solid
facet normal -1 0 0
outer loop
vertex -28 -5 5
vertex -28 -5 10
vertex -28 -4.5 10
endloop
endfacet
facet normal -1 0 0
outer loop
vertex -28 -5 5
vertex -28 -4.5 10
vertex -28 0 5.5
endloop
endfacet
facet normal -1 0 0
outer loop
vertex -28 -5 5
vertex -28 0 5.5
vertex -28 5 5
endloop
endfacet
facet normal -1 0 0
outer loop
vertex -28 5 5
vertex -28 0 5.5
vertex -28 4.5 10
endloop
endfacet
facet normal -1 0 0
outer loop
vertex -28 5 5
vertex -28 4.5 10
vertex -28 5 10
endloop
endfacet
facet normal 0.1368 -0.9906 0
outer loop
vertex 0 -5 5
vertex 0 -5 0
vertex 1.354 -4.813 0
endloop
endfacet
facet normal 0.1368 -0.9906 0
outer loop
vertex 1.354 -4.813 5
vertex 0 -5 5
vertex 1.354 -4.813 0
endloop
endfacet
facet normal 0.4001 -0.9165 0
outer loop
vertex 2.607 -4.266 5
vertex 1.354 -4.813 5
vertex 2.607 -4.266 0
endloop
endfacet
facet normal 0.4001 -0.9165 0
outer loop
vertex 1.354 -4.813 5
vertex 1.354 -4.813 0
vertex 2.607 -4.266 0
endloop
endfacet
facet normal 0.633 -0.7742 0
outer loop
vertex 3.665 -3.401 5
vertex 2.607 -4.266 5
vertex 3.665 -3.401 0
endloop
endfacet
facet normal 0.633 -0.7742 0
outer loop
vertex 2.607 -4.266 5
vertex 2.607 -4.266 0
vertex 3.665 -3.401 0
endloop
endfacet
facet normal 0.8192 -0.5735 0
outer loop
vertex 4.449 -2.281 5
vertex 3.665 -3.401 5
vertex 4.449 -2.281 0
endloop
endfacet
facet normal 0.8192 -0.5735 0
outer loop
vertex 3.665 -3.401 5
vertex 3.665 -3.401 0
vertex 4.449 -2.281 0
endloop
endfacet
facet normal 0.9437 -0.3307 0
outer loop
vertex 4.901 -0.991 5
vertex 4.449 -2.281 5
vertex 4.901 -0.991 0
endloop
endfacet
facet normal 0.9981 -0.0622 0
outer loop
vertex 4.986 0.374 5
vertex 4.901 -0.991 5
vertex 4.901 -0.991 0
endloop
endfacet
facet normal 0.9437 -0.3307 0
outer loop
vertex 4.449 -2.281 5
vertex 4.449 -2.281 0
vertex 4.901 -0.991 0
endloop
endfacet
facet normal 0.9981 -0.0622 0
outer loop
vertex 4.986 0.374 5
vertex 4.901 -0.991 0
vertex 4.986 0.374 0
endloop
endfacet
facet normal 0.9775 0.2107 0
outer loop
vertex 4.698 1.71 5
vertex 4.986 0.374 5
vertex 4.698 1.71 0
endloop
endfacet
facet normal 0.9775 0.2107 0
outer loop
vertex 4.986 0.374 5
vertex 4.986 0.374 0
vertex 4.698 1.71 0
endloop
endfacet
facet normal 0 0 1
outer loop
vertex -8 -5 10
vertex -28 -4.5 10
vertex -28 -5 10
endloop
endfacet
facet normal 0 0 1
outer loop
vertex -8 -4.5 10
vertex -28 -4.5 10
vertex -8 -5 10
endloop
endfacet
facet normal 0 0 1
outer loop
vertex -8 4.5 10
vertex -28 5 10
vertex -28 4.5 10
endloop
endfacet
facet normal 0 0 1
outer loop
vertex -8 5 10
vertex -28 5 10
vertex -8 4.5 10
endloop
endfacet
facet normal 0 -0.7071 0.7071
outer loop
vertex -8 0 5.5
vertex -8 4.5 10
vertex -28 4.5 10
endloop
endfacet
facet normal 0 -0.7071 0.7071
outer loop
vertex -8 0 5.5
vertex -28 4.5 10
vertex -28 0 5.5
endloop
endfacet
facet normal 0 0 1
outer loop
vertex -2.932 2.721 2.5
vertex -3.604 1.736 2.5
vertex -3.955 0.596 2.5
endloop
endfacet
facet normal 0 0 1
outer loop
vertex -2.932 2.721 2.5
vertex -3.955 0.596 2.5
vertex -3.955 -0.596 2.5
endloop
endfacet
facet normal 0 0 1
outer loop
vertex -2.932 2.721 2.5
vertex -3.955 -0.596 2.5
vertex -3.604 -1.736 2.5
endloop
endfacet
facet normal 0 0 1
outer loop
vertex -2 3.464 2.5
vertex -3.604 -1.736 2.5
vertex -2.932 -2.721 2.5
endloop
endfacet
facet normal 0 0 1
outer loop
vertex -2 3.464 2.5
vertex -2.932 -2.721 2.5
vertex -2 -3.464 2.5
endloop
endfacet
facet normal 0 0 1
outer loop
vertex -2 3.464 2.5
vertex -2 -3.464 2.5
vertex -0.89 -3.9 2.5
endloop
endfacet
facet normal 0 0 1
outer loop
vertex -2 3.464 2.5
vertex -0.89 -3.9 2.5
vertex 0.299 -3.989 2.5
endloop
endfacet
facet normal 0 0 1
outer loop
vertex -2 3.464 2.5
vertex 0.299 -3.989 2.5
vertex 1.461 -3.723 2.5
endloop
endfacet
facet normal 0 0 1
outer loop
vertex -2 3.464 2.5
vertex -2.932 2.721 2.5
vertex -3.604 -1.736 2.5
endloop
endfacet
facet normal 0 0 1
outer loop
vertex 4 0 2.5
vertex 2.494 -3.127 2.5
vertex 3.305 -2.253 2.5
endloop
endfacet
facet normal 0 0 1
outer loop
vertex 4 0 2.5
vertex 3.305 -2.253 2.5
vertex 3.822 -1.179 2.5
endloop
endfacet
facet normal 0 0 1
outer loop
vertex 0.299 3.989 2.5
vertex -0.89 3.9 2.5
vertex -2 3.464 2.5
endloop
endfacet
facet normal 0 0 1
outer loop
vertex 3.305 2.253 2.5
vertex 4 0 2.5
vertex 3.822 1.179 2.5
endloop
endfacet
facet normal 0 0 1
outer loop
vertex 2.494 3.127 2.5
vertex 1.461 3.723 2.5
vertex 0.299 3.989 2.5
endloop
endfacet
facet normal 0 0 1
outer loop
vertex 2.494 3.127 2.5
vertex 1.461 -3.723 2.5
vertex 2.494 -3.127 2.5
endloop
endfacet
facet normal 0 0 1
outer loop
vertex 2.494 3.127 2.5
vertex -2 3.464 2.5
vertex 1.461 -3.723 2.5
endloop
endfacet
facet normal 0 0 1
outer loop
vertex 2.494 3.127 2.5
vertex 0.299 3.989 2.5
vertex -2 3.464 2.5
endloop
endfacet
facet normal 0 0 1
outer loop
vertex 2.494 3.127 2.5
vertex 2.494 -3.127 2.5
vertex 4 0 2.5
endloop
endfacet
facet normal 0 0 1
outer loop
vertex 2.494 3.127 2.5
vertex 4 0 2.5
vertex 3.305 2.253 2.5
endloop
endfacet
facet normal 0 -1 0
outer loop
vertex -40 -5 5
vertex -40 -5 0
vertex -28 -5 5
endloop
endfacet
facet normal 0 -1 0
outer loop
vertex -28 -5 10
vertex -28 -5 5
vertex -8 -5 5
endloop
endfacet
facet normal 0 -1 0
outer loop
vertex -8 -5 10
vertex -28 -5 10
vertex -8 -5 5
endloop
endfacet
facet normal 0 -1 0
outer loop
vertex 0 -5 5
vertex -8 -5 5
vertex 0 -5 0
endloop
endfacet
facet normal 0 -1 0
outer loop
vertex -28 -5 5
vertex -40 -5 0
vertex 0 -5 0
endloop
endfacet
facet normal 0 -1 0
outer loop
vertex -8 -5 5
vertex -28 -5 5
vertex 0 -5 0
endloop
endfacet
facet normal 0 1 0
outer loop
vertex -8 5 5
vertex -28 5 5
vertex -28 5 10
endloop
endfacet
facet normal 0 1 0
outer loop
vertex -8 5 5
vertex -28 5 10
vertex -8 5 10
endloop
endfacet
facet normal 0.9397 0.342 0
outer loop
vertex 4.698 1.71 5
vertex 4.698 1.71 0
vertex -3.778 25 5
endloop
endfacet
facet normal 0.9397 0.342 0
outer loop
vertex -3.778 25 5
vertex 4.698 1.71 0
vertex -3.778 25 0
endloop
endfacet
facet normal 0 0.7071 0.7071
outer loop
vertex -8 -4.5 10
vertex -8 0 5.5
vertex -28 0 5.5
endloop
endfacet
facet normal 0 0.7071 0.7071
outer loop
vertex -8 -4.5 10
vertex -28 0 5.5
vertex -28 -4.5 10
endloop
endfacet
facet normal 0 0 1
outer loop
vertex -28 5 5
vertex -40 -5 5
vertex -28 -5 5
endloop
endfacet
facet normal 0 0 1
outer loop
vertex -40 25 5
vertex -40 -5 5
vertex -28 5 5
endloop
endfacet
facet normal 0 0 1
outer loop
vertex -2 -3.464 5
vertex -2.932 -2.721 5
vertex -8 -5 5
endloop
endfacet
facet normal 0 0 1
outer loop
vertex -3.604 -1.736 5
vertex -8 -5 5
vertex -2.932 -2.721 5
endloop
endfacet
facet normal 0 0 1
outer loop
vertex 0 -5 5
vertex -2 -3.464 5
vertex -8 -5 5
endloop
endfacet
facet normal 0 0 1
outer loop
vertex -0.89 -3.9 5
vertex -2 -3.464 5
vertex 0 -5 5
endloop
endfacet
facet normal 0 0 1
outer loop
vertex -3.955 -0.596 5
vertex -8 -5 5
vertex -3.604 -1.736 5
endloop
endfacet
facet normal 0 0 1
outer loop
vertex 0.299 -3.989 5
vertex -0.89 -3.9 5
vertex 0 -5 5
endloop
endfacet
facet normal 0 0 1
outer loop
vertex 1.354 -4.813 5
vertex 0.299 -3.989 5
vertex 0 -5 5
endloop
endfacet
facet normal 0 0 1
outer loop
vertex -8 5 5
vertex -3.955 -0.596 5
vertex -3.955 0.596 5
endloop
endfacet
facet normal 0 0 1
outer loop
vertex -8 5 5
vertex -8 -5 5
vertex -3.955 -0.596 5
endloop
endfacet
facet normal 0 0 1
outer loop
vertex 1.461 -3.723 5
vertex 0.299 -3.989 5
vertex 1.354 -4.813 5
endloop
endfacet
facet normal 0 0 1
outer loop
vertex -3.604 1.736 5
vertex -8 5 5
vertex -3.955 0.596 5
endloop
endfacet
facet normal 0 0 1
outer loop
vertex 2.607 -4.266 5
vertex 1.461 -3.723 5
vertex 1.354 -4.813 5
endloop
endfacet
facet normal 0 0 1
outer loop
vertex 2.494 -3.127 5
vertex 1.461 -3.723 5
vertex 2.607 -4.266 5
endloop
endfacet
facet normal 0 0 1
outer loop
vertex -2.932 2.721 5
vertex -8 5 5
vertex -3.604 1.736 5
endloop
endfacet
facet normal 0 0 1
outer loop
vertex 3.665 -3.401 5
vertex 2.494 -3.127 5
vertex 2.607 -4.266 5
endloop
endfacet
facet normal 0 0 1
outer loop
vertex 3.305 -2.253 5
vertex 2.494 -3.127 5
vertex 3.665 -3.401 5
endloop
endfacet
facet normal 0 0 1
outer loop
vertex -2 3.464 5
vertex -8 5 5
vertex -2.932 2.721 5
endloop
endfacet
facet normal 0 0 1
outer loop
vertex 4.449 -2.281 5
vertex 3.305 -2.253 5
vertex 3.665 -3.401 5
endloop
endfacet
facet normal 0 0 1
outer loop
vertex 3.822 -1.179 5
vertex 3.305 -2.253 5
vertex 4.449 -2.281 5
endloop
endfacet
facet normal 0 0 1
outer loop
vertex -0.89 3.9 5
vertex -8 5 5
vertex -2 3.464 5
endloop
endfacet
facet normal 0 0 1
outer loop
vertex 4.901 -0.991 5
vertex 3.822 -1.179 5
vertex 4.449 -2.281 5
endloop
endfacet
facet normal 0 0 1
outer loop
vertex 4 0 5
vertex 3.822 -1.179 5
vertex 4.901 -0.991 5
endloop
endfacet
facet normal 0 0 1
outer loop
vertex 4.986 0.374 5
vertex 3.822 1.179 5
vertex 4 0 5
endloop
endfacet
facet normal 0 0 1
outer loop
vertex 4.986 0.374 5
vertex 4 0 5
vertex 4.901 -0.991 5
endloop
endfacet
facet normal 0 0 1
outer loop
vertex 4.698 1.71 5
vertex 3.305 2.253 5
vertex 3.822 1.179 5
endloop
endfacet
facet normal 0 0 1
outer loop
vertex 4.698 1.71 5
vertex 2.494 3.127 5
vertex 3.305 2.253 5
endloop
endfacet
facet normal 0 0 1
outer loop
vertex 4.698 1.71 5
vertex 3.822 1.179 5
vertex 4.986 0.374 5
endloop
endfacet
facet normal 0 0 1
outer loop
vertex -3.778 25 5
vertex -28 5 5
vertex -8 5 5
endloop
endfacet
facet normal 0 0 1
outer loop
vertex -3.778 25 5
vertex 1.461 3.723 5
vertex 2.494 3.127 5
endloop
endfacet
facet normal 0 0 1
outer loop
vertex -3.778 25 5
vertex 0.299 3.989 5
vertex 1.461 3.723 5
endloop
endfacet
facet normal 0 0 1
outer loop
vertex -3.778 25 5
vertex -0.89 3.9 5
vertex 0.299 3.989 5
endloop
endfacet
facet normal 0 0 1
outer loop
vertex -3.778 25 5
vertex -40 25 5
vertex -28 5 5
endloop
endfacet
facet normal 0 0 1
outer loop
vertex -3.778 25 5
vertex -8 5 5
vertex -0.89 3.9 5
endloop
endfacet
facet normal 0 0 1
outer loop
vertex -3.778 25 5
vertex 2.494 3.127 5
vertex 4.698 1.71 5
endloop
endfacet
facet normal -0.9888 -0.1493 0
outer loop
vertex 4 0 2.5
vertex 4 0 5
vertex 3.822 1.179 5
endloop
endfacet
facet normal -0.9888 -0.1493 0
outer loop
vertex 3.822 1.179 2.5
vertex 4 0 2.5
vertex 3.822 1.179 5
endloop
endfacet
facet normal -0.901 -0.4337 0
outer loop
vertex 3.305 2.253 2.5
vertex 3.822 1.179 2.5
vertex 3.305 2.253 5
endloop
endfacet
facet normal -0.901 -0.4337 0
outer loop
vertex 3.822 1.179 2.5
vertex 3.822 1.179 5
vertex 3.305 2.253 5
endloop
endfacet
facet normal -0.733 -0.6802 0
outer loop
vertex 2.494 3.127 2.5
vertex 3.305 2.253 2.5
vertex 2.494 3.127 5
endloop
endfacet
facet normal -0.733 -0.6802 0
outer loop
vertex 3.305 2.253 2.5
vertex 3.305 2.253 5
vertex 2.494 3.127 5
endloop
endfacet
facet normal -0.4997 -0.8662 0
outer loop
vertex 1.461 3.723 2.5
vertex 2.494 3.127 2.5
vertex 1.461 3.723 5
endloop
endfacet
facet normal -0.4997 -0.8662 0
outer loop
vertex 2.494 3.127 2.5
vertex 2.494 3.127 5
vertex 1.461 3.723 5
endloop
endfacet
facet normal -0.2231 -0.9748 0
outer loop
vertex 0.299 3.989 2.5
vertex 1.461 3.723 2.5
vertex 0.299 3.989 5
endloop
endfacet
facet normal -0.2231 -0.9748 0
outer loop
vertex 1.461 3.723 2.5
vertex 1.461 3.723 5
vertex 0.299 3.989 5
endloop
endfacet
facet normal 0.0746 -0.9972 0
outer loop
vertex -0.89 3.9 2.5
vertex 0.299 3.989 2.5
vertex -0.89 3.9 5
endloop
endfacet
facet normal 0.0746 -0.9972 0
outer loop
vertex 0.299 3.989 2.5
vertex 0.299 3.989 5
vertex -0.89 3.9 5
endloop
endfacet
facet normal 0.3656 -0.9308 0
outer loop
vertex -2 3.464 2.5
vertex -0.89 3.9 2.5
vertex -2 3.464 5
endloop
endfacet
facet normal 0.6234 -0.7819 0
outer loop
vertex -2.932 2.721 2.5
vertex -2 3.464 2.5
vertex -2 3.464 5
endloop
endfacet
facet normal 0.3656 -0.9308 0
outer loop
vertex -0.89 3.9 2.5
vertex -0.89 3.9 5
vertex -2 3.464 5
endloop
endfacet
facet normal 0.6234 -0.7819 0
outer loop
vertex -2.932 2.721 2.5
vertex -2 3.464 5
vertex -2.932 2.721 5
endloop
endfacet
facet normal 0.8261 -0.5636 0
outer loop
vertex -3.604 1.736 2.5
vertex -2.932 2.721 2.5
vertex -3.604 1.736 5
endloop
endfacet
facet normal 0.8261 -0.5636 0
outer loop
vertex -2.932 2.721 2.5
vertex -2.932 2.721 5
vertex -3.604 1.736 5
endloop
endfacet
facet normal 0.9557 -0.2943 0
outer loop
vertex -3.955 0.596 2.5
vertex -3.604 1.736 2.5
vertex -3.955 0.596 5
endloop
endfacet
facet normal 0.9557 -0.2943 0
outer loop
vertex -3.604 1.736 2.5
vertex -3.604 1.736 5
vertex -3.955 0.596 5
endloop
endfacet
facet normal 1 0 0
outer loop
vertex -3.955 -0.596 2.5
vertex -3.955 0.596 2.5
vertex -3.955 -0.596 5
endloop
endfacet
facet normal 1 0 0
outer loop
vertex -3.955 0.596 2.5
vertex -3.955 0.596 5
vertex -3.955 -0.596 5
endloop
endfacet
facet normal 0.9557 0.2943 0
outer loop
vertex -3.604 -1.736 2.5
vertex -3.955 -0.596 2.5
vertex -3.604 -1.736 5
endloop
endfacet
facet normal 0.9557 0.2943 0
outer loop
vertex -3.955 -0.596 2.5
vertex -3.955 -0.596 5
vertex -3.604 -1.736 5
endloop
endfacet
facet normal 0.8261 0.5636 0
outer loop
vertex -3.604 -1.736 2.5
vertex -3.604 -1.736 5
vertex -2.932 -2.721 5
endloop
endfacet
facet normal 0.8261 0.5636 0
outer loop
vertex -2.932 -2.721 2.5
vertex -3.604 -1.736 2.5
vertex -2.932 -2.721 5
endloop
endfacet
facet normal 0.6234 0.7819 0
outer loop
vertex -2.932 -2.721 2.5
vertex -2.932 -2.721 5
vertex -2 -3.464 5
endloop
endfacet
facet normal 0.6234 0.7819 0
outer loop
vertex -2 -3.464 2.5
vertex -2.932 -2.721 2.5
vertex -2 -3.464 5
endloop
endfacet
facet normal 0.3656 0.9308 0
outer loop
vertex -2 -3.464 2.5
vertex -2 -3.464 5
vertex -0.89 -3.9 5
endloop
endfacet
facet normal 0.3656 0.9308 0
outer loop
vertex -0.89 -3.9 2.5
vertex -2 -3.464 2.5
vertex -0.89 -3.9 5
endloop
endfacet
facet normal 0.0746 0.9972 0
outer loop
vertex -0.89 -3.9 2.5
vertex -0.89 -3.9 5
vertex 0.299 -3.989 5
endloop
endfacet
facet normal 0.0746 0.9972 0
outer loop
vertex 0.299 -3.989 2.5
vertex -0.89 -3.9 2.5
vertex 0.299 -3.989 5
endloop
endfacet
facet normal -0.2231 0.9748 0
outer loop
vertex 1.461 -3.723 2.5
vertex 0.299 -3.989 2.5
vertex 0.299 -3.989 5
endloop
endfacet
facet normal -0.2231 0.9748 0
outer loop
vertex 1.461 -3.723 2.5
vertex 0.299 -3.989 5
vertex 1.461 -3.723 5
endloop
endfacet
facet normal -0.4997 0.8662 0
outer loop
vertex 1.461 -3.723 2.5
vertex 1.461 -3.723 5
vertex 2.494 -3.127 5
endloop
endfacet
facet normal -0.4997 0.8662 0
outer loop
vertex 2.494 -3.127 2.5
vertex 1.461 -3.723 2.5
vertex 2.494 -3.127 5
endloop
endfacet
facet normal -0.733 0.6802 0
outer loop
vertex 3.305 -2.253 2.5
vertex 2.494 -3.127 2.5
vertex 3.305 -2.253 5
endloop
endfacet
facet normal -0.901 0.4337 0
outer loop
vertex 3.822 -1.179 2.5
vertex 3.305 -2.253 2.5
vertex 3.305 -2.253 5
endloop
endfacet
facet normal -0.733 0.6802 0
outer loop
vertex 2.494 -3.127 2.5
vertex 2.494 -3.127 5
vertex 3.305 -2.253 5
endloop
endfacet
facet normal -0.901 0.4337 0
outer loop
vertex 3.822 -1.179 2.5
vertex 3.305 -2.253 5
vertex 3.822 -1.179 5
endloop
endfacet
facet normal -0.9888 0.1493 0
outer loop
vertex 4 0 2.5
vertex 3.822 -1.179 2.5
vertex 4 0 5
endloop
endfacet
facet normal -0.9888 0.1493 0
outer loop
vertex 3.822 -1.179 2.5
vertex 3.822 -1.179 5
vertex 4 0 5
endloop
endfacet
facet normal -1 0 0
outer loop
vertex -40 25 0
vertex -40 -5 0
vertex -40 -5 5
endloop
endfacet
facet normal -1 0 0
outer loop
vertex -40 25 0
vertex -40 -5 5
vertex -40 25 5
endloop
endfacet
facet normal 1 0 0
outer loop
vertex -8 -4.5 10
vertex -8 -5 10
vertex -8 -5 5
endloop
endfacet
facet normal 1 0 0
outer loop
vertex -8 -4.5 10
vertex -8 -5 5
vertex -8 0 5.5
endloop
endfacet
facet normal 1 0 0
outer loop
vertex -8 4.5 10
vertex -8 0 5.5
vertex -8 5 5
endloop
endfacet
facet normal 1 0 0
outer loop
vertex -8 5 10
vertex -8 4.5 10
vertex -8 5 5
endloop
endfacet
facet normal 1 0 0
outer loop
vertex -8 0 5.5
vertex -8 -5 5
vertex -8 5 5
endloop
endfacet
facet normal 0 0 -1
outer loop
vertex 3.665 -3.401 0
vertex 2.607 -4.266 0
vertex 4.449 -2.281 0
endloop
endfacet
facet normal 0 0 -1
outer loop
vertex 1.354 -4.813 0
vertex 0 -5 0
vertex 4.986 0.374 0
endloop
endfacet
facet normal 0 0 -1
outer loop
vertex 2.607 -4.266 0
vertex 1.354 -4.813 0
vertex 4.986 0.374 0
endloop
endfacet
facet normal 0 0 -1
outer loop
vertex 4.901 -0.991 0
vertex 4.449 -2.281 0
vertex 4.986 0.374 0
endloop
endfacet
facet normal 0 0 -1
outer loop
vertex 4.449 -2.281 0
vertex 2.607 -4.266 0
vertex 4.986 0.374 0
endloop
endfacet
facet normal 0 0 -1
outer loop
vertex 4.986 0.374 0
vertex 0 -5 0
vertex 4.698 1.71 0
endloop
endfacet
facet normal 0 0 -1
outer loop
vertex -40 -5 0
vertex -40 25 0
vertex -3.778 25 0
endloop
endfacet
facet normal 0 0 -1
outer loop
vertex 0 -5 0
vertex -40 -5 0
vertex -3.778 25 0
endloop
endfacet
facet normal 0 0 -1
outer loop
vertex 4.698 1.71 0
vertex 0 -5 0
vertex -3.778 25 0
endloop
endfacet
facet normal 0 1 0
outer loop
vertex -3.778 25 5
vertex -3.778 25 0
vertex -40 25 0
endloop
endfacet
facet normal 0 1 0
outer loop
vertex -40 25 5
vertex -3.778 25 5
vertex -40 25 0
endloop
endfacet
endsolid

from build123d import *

# Parameters (mm, degrees)
SKETCH_1_R          = 5
EXTRUDE_1_DEPTH     = 5
SKETCH_2_R          = 4
CUT_EXTRUDE_1_DEPTH = 2.5
SKETCH_3_W          = 32
SKETCH_3_H          = 10
EXTRUDE_2_DEPTH     = 5
CUT_EXTRUDE_2_DEPTH = 20
SKETCH_5_W          = 12
SKETCH_5_H          = 10
CUT_EXTRUDE_3_DEPTH = 5


with BuildPart() as part:
    # 草图1 → 凸台-拉伸1 (new body)
    with BuildSketch(Plane.XY):
        Circle(SKETCH_1_R)
        with BuildLine():
            Line((-40, -5), (0, -5))
            ThreePointArc((0, -5), (-4.095760221, 2.867882182), (4.698463104, 1.710100717))
            Line((4.698463104, 1.710100717), (-3.778366994, 25))
            Line((-3.778366994, 25), (-40, 25))
            Line((-40, 25), (-40, -5))
        make_face()
    extrude(amount=EXTRUDE_1_DEPTH)

    # 草图2 → 切除-拉伸1 (cut)
    with BuildSketch(Plane.XY.offset(5)):
        Circle(SKETCH_2_R)
    extrude(amount=-CUT_EXTRUDE_1_DEPTH, mode=Mode.SUBTRACT)

    # 草图3 → 凸台-拉伸2 (add)
    with BuildSketch(Plane.XY.offset(5)):
        with Locations((-24, 0)):
            Rectangle(SKETCH_3_W, SKETCH_3_H)
    extrude(amount=EXTRUDE_2_DEPTH)

    # 草图4 → 切除-拉伸2 (cut)
    with BuildSketch(Plane(origin=(-8, 0, 0), x_dir=(0, 0, -1), z_dir=(1, 0, 0))):
        Polygon((-10, 4.5), (-5.5, 0), (-10, -4.5), align=None)
    extrude(amount=-CUT_EXTRUDE_2_DEPTH, mode=Mode.SUBTRACT)

    # 草图5 → 切除-拉伸3 (cut)
    with BuildSketch(Plane.XY.offset(10)):
        with Locations((-34, 0)):
            Rectangle(SKETCH_5_W, SKETCH_5_H)
    extrude(amount=-CUT_EXTRUDE_3_DEPTH, mode=Mode.SUBTRACT)


solid = part.part
